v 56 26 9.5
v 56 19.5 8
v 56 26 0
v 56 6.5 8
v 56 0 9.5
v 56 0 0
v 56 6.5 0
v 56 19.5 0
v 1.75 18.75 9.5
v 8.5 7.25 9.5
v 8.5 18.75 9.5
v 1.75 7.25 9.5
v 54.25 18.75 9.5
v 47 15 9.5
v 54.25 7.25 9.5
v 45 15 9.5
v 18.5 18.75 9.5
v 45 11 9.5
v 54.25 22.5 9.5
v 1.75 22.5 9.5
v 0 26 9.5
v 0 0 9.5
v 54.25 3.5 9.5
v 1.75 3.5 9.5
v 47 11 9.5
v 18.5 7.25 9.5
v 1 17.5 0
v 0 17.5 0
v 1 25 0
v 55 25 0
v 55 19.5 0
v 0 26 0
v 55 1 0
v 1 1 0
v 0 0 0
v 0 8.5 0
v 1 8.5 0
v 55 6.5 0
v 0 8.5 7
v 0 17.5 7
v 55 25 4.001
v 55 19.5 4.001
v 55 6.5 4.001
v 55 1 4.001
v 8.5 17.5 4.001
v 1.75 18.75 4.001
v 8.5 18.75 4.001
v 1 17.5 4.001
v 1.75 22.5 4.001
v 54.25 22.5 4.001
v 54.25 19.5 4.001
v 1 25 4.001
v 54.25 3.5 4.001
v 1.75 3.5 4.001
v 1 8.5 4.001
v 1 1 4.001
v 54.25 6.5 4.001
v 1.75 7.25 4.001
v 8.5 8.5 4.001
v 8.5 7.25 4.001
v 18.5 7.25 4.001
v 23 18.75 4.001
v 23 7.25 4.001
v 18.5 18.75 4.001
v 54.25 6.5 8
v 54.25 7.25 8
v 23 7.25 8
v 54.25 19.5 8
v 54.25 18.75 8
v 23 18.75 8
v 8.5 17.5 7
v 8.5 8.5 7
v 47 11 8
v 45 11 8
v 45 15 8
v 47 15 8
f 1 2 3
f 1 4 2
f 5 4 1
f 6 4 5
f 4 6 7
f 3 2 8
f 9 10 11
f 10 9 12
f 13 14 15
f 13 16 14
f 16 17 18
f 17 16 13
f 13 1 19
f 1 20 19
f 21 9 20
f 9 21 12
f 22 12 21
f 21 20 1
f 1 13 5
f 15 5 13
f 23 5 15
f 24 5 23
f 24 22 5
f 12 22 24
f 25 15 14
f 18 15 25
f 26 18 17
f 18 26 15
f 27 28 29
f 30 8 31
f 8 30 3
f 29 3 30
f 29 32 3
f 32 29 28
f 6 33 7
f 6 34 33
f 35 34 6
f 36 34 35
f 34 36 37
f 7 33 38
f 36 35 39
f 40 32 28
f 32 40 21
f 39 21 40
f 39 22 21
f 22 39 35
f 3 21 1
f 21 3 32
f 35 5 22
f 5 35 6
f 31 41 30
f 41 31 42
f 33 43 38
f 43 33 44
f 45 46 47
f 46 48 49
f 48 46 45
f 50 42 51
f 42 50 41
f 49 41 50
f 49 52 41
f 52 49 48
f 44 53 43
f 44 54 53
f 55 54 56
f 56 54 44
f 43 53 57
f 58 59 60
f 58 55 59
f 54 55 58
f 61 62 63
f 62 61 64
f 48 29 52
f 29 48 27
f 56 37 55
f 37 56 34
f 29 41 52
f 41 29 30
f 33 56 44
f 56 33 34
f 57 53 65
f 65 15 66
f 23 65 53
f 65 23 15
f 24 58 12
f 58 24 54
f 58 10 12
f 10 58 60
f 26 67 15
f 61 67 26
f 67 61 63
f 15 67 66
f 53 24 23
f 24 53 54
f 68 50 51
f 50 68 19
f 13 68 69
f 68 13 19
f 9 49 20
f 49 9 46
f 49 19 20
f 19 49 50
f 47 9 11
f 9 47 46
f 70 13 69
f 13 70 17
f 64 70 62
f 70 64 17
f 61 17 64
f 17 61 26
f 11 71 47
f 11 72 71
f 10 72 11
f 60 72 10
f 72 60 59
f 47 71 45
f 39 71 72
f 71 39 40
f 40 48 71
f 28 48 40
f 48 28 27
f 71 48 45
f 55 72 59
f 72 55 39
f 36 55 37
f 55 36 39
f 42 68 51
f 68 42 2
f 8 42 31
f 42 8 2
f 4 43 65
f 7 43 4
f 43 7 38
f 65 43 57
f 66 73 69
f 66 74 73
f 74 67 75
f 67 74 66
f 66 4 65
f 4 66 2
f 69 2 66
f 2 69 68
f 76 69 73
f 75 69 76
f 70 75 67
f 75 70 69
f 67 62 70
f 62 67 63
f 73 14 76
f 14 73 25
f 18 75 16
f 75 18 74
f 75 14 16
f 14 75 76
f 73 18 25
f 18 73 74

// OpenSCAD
// file: bluepill.scad
include <_const.scad>;

pcb_x = 53;
pcb_y = 23;
pcb_z = 4;

usb_x = 6;
usb_y = 8;
usb_z = 2.5;

jumpers_x = 8;
jumpers_y = 5;
jumpers_z = 8;
jumpers_offset_x = 8;
jumpers_offset_y = 12;

reset_x = 6;
reset_y = 3;
reset_z = 5;
reset_offset_x = 9;
reset_offset_y = 6;

mcu_x = 7;
mcu_y = 7;
mcu_z = 2;
mcu_offset_x = 26;
mcu_offset_y = 7;

oscillator_x = 4;
oscillator_y = 11;
oscillator_z = 4;
oscillator_offset_x = 33;

psu_x = 3;
psu_y = 8;
psu_z = 3;
psu_offset_x = 38;

led_x = 1.5;
led_y = 2;
led_z = 1;
led_offset_x = 43.5;
custom_led_offset_y = 8;
power_led_offset_y = 14;

swd_x = 4;
swd_y = 10;
swd_z = 2.75;

pin_header_x = 51.5;
pin_header_y = 2.75;
pin_header_base_z = 2.5;
pin_header_pin_z = 5.5;
pin_header_offset_x = 0.75;
pin_header_offset_y = 2.5;

module bluepill() {
  color("blue") {
    cube([pcb_x, pcb_y, pcb_z]);
  }

  color("silver") {
    translate([0, (pcb_y - usb_y) / 2, pcb_z - E])
      cube([usb_x, usb_y, usb_z]);
  }

  color("gold") {
    translate([jumpers_offset_x, jumpers_offset_y, pcb_z - E])
      cube([jumpers_x, jumpers_y, jumpers_z]);
  }

  color("white") {
    translate([reset_offset_x, reset_offset_y, pcb_z - E])
      cube([reset_x, reset_y, reset_z]);
  }

  color("black") {
    translate([mcu_offset_x, mcu_offset_y, pcb_z - E])
      rotate(45)
        cube([mcu_x, mcu_y, mcu_z]);
  }

  color("silver") {
    translate([oscillator_offset_x, (pcb_y - oscillator_y) / 2, pcb_z - E])
      cube([oscillator_x, oscillator_y, oscillator_z]);
  }

  color("black") {
    translate([psu_offset_x, (pcb_y - psu_y) / 2, pcb_z - E])
      cube([psu_x, psu_y, psu_z]);
  }

  color("lime") {
    translate([led_offset_x, custom_led_offset_y, pcb_z - E])
      cube([led_x, led_y, led_z]);
  }
  color("red") {
    translate([led_offset_x, power_led_offset_y, pcb_z - E])
      cube([led_x, led_y, led_z]);
  }

  color("black") {
    translate([pcb_x - swd_x, (pcb_y - swd_y) / 2, pcb_z - E])
      cube([swd_x, swd_y, swd_z]);
  }

  color("yellow") {
    translate([pin_header_offset_x, pin_header_offset_y, pcb_z - E])
      cube([pin_header_x, pin_header_y, pin_header_base_z]);
    translate([pin_header_offset_x, pcb_y - pin_header_offset_y - pin_header_y, pcb_z - E])
      cube([pin_header_x, pin_header_y, pin_header_base_z]);
  }
  color("khaki") {
    translate([pin_header_offset_x, pin_header_offset_y, pcb_z + pin_header_base_z - E])
      cube([pin_header_x, pin_header_y, pin_header_pin_z]);
    translate([pin_header_offset_x, pcb_y - pin_header_offset_y - pin_header_y, pcb_z + pin_header_base_z - E])
      cube([pin_header_x, pin_header_y, pin_header_pin_z]);
  }
}
// file: _const.scad
E = $preview ? 0.01 : 0.001;
E2 = E * 2;
$fn = $preview ? 12 : 72;
INFINITY = 1000;
// main file
include <_const.scad>;
include <bluepill.scad>;

/*translate([wall, wall, 0])*/
  /*bluepill();*/

wall = 1.5;

pcb_cutoff_d = 0.5;

pin_header_cutoff_d = 0.5;

jumpers_cutoff_x = 10;
jumpers_cutoff_y = 14;
jumpers_cutoff_offset_x = 7;

usb_cutoff_x = 8;
usb_cutoff_y = 9;
usb_cutoff_z = 3;

swd_cutoff_x = 4.5;
swd_cutoff_y = 13;
swd_cutoff_z = 3;

inner_cutoff_x = 33;
inner_cutoff_y = 13;

led_hole_x = 2;
led_hole_y = 4;
led_hole_offset_x = 43.5;

difference() {
  cube([wall + pcb_x + wall, wall + pcb_y + wall, pcb_z + oscillator_z + wall]);

  translate([wall - pcb_cutoff_d, wall - pcb_cutoff_d, -E])
    cube([pcb_cutoff_d + pcb_x + pcb_cutoff_d, pcb_cutoff_d + pcb_y + pcb_cutoff_d, pcb_z + E2]);

  translate([wall + pin_header_offset_x - pin_header_cutoff_d, wall + pin_header_offset_y - pin_header_cutoff_d, pcb_z])
    cube([pin_header_cutoff_d + pin_header_x + pin_header_cutoff_d, pin_header_cutoff_d + pin_header_y + pin_header_cutoff_d, pin_header_base_z + pin_header_pin_z + E]);
  translate([wall + pin_header_offset_x - pin_header_cutoff_d, wall + pcb_y - pin_header_offset_y - pin_header_y - pin_header_cutoff_d, pcb_z])
    cube([pin_header_cutoff_d + pin_header_x + pin_header_cutoff_d, pin_header_cutoff_d + pin_header_y + pin_header_cutoff_d, pin_header_base_z + pin_header_pin_z + E]);

  translate([wall + jumpers_cutoff_offset_x, wall + (pcb_y - jumpers_cutoff_y) / 2, pcb_z])
    cube([jumpers_cutoff_x, jumpers_cutoff_y, jumpers_z]);

  translate([-E, wall + (pcb_y - usb_cutoff_y) / 2, pcb_z])
    cube([wall + usb_cutoff_x + E, usb_cutoff_y, usb_cutoff_z]);

  translate([-E, wall + (pcb_y - usb_cutoff_y) / 2, pcb_z - INFINITY + E])
    cube([wall + E2, usb_cutoff_y, INFINITY]);

  translate([wall + pcb_x - swd_cutoff_x + E, wall + (pcb_y - swd_cutoff_y) / 2, pcb_z])
    cube([wall + swd_cutoff_x + E, swd_cutoff_y, swd_cutoff_z]);

  translate([wall + pcb_x + E, wall + (pcb_y - swd_cutoff_y) / 2, pcb_z - INFINITY + E])
    cube([wall + E2, swd_cutoff_y, INFINITY]);

  translate([wall + pcb_x + wall - inner_cutoff_x, wall + (pcb_y - inner_cutoff_y) / 2, pcb_z])
    cube([inner_cutoff_x, inner_cutoff_y, oscillator_z]);

  translate([wall + led_hole_offset_x, wall + (pcb_y - led_hole_y) / 2, 0])
    cube([led_hole_x, led_hole_y, INFINITY]);
}
